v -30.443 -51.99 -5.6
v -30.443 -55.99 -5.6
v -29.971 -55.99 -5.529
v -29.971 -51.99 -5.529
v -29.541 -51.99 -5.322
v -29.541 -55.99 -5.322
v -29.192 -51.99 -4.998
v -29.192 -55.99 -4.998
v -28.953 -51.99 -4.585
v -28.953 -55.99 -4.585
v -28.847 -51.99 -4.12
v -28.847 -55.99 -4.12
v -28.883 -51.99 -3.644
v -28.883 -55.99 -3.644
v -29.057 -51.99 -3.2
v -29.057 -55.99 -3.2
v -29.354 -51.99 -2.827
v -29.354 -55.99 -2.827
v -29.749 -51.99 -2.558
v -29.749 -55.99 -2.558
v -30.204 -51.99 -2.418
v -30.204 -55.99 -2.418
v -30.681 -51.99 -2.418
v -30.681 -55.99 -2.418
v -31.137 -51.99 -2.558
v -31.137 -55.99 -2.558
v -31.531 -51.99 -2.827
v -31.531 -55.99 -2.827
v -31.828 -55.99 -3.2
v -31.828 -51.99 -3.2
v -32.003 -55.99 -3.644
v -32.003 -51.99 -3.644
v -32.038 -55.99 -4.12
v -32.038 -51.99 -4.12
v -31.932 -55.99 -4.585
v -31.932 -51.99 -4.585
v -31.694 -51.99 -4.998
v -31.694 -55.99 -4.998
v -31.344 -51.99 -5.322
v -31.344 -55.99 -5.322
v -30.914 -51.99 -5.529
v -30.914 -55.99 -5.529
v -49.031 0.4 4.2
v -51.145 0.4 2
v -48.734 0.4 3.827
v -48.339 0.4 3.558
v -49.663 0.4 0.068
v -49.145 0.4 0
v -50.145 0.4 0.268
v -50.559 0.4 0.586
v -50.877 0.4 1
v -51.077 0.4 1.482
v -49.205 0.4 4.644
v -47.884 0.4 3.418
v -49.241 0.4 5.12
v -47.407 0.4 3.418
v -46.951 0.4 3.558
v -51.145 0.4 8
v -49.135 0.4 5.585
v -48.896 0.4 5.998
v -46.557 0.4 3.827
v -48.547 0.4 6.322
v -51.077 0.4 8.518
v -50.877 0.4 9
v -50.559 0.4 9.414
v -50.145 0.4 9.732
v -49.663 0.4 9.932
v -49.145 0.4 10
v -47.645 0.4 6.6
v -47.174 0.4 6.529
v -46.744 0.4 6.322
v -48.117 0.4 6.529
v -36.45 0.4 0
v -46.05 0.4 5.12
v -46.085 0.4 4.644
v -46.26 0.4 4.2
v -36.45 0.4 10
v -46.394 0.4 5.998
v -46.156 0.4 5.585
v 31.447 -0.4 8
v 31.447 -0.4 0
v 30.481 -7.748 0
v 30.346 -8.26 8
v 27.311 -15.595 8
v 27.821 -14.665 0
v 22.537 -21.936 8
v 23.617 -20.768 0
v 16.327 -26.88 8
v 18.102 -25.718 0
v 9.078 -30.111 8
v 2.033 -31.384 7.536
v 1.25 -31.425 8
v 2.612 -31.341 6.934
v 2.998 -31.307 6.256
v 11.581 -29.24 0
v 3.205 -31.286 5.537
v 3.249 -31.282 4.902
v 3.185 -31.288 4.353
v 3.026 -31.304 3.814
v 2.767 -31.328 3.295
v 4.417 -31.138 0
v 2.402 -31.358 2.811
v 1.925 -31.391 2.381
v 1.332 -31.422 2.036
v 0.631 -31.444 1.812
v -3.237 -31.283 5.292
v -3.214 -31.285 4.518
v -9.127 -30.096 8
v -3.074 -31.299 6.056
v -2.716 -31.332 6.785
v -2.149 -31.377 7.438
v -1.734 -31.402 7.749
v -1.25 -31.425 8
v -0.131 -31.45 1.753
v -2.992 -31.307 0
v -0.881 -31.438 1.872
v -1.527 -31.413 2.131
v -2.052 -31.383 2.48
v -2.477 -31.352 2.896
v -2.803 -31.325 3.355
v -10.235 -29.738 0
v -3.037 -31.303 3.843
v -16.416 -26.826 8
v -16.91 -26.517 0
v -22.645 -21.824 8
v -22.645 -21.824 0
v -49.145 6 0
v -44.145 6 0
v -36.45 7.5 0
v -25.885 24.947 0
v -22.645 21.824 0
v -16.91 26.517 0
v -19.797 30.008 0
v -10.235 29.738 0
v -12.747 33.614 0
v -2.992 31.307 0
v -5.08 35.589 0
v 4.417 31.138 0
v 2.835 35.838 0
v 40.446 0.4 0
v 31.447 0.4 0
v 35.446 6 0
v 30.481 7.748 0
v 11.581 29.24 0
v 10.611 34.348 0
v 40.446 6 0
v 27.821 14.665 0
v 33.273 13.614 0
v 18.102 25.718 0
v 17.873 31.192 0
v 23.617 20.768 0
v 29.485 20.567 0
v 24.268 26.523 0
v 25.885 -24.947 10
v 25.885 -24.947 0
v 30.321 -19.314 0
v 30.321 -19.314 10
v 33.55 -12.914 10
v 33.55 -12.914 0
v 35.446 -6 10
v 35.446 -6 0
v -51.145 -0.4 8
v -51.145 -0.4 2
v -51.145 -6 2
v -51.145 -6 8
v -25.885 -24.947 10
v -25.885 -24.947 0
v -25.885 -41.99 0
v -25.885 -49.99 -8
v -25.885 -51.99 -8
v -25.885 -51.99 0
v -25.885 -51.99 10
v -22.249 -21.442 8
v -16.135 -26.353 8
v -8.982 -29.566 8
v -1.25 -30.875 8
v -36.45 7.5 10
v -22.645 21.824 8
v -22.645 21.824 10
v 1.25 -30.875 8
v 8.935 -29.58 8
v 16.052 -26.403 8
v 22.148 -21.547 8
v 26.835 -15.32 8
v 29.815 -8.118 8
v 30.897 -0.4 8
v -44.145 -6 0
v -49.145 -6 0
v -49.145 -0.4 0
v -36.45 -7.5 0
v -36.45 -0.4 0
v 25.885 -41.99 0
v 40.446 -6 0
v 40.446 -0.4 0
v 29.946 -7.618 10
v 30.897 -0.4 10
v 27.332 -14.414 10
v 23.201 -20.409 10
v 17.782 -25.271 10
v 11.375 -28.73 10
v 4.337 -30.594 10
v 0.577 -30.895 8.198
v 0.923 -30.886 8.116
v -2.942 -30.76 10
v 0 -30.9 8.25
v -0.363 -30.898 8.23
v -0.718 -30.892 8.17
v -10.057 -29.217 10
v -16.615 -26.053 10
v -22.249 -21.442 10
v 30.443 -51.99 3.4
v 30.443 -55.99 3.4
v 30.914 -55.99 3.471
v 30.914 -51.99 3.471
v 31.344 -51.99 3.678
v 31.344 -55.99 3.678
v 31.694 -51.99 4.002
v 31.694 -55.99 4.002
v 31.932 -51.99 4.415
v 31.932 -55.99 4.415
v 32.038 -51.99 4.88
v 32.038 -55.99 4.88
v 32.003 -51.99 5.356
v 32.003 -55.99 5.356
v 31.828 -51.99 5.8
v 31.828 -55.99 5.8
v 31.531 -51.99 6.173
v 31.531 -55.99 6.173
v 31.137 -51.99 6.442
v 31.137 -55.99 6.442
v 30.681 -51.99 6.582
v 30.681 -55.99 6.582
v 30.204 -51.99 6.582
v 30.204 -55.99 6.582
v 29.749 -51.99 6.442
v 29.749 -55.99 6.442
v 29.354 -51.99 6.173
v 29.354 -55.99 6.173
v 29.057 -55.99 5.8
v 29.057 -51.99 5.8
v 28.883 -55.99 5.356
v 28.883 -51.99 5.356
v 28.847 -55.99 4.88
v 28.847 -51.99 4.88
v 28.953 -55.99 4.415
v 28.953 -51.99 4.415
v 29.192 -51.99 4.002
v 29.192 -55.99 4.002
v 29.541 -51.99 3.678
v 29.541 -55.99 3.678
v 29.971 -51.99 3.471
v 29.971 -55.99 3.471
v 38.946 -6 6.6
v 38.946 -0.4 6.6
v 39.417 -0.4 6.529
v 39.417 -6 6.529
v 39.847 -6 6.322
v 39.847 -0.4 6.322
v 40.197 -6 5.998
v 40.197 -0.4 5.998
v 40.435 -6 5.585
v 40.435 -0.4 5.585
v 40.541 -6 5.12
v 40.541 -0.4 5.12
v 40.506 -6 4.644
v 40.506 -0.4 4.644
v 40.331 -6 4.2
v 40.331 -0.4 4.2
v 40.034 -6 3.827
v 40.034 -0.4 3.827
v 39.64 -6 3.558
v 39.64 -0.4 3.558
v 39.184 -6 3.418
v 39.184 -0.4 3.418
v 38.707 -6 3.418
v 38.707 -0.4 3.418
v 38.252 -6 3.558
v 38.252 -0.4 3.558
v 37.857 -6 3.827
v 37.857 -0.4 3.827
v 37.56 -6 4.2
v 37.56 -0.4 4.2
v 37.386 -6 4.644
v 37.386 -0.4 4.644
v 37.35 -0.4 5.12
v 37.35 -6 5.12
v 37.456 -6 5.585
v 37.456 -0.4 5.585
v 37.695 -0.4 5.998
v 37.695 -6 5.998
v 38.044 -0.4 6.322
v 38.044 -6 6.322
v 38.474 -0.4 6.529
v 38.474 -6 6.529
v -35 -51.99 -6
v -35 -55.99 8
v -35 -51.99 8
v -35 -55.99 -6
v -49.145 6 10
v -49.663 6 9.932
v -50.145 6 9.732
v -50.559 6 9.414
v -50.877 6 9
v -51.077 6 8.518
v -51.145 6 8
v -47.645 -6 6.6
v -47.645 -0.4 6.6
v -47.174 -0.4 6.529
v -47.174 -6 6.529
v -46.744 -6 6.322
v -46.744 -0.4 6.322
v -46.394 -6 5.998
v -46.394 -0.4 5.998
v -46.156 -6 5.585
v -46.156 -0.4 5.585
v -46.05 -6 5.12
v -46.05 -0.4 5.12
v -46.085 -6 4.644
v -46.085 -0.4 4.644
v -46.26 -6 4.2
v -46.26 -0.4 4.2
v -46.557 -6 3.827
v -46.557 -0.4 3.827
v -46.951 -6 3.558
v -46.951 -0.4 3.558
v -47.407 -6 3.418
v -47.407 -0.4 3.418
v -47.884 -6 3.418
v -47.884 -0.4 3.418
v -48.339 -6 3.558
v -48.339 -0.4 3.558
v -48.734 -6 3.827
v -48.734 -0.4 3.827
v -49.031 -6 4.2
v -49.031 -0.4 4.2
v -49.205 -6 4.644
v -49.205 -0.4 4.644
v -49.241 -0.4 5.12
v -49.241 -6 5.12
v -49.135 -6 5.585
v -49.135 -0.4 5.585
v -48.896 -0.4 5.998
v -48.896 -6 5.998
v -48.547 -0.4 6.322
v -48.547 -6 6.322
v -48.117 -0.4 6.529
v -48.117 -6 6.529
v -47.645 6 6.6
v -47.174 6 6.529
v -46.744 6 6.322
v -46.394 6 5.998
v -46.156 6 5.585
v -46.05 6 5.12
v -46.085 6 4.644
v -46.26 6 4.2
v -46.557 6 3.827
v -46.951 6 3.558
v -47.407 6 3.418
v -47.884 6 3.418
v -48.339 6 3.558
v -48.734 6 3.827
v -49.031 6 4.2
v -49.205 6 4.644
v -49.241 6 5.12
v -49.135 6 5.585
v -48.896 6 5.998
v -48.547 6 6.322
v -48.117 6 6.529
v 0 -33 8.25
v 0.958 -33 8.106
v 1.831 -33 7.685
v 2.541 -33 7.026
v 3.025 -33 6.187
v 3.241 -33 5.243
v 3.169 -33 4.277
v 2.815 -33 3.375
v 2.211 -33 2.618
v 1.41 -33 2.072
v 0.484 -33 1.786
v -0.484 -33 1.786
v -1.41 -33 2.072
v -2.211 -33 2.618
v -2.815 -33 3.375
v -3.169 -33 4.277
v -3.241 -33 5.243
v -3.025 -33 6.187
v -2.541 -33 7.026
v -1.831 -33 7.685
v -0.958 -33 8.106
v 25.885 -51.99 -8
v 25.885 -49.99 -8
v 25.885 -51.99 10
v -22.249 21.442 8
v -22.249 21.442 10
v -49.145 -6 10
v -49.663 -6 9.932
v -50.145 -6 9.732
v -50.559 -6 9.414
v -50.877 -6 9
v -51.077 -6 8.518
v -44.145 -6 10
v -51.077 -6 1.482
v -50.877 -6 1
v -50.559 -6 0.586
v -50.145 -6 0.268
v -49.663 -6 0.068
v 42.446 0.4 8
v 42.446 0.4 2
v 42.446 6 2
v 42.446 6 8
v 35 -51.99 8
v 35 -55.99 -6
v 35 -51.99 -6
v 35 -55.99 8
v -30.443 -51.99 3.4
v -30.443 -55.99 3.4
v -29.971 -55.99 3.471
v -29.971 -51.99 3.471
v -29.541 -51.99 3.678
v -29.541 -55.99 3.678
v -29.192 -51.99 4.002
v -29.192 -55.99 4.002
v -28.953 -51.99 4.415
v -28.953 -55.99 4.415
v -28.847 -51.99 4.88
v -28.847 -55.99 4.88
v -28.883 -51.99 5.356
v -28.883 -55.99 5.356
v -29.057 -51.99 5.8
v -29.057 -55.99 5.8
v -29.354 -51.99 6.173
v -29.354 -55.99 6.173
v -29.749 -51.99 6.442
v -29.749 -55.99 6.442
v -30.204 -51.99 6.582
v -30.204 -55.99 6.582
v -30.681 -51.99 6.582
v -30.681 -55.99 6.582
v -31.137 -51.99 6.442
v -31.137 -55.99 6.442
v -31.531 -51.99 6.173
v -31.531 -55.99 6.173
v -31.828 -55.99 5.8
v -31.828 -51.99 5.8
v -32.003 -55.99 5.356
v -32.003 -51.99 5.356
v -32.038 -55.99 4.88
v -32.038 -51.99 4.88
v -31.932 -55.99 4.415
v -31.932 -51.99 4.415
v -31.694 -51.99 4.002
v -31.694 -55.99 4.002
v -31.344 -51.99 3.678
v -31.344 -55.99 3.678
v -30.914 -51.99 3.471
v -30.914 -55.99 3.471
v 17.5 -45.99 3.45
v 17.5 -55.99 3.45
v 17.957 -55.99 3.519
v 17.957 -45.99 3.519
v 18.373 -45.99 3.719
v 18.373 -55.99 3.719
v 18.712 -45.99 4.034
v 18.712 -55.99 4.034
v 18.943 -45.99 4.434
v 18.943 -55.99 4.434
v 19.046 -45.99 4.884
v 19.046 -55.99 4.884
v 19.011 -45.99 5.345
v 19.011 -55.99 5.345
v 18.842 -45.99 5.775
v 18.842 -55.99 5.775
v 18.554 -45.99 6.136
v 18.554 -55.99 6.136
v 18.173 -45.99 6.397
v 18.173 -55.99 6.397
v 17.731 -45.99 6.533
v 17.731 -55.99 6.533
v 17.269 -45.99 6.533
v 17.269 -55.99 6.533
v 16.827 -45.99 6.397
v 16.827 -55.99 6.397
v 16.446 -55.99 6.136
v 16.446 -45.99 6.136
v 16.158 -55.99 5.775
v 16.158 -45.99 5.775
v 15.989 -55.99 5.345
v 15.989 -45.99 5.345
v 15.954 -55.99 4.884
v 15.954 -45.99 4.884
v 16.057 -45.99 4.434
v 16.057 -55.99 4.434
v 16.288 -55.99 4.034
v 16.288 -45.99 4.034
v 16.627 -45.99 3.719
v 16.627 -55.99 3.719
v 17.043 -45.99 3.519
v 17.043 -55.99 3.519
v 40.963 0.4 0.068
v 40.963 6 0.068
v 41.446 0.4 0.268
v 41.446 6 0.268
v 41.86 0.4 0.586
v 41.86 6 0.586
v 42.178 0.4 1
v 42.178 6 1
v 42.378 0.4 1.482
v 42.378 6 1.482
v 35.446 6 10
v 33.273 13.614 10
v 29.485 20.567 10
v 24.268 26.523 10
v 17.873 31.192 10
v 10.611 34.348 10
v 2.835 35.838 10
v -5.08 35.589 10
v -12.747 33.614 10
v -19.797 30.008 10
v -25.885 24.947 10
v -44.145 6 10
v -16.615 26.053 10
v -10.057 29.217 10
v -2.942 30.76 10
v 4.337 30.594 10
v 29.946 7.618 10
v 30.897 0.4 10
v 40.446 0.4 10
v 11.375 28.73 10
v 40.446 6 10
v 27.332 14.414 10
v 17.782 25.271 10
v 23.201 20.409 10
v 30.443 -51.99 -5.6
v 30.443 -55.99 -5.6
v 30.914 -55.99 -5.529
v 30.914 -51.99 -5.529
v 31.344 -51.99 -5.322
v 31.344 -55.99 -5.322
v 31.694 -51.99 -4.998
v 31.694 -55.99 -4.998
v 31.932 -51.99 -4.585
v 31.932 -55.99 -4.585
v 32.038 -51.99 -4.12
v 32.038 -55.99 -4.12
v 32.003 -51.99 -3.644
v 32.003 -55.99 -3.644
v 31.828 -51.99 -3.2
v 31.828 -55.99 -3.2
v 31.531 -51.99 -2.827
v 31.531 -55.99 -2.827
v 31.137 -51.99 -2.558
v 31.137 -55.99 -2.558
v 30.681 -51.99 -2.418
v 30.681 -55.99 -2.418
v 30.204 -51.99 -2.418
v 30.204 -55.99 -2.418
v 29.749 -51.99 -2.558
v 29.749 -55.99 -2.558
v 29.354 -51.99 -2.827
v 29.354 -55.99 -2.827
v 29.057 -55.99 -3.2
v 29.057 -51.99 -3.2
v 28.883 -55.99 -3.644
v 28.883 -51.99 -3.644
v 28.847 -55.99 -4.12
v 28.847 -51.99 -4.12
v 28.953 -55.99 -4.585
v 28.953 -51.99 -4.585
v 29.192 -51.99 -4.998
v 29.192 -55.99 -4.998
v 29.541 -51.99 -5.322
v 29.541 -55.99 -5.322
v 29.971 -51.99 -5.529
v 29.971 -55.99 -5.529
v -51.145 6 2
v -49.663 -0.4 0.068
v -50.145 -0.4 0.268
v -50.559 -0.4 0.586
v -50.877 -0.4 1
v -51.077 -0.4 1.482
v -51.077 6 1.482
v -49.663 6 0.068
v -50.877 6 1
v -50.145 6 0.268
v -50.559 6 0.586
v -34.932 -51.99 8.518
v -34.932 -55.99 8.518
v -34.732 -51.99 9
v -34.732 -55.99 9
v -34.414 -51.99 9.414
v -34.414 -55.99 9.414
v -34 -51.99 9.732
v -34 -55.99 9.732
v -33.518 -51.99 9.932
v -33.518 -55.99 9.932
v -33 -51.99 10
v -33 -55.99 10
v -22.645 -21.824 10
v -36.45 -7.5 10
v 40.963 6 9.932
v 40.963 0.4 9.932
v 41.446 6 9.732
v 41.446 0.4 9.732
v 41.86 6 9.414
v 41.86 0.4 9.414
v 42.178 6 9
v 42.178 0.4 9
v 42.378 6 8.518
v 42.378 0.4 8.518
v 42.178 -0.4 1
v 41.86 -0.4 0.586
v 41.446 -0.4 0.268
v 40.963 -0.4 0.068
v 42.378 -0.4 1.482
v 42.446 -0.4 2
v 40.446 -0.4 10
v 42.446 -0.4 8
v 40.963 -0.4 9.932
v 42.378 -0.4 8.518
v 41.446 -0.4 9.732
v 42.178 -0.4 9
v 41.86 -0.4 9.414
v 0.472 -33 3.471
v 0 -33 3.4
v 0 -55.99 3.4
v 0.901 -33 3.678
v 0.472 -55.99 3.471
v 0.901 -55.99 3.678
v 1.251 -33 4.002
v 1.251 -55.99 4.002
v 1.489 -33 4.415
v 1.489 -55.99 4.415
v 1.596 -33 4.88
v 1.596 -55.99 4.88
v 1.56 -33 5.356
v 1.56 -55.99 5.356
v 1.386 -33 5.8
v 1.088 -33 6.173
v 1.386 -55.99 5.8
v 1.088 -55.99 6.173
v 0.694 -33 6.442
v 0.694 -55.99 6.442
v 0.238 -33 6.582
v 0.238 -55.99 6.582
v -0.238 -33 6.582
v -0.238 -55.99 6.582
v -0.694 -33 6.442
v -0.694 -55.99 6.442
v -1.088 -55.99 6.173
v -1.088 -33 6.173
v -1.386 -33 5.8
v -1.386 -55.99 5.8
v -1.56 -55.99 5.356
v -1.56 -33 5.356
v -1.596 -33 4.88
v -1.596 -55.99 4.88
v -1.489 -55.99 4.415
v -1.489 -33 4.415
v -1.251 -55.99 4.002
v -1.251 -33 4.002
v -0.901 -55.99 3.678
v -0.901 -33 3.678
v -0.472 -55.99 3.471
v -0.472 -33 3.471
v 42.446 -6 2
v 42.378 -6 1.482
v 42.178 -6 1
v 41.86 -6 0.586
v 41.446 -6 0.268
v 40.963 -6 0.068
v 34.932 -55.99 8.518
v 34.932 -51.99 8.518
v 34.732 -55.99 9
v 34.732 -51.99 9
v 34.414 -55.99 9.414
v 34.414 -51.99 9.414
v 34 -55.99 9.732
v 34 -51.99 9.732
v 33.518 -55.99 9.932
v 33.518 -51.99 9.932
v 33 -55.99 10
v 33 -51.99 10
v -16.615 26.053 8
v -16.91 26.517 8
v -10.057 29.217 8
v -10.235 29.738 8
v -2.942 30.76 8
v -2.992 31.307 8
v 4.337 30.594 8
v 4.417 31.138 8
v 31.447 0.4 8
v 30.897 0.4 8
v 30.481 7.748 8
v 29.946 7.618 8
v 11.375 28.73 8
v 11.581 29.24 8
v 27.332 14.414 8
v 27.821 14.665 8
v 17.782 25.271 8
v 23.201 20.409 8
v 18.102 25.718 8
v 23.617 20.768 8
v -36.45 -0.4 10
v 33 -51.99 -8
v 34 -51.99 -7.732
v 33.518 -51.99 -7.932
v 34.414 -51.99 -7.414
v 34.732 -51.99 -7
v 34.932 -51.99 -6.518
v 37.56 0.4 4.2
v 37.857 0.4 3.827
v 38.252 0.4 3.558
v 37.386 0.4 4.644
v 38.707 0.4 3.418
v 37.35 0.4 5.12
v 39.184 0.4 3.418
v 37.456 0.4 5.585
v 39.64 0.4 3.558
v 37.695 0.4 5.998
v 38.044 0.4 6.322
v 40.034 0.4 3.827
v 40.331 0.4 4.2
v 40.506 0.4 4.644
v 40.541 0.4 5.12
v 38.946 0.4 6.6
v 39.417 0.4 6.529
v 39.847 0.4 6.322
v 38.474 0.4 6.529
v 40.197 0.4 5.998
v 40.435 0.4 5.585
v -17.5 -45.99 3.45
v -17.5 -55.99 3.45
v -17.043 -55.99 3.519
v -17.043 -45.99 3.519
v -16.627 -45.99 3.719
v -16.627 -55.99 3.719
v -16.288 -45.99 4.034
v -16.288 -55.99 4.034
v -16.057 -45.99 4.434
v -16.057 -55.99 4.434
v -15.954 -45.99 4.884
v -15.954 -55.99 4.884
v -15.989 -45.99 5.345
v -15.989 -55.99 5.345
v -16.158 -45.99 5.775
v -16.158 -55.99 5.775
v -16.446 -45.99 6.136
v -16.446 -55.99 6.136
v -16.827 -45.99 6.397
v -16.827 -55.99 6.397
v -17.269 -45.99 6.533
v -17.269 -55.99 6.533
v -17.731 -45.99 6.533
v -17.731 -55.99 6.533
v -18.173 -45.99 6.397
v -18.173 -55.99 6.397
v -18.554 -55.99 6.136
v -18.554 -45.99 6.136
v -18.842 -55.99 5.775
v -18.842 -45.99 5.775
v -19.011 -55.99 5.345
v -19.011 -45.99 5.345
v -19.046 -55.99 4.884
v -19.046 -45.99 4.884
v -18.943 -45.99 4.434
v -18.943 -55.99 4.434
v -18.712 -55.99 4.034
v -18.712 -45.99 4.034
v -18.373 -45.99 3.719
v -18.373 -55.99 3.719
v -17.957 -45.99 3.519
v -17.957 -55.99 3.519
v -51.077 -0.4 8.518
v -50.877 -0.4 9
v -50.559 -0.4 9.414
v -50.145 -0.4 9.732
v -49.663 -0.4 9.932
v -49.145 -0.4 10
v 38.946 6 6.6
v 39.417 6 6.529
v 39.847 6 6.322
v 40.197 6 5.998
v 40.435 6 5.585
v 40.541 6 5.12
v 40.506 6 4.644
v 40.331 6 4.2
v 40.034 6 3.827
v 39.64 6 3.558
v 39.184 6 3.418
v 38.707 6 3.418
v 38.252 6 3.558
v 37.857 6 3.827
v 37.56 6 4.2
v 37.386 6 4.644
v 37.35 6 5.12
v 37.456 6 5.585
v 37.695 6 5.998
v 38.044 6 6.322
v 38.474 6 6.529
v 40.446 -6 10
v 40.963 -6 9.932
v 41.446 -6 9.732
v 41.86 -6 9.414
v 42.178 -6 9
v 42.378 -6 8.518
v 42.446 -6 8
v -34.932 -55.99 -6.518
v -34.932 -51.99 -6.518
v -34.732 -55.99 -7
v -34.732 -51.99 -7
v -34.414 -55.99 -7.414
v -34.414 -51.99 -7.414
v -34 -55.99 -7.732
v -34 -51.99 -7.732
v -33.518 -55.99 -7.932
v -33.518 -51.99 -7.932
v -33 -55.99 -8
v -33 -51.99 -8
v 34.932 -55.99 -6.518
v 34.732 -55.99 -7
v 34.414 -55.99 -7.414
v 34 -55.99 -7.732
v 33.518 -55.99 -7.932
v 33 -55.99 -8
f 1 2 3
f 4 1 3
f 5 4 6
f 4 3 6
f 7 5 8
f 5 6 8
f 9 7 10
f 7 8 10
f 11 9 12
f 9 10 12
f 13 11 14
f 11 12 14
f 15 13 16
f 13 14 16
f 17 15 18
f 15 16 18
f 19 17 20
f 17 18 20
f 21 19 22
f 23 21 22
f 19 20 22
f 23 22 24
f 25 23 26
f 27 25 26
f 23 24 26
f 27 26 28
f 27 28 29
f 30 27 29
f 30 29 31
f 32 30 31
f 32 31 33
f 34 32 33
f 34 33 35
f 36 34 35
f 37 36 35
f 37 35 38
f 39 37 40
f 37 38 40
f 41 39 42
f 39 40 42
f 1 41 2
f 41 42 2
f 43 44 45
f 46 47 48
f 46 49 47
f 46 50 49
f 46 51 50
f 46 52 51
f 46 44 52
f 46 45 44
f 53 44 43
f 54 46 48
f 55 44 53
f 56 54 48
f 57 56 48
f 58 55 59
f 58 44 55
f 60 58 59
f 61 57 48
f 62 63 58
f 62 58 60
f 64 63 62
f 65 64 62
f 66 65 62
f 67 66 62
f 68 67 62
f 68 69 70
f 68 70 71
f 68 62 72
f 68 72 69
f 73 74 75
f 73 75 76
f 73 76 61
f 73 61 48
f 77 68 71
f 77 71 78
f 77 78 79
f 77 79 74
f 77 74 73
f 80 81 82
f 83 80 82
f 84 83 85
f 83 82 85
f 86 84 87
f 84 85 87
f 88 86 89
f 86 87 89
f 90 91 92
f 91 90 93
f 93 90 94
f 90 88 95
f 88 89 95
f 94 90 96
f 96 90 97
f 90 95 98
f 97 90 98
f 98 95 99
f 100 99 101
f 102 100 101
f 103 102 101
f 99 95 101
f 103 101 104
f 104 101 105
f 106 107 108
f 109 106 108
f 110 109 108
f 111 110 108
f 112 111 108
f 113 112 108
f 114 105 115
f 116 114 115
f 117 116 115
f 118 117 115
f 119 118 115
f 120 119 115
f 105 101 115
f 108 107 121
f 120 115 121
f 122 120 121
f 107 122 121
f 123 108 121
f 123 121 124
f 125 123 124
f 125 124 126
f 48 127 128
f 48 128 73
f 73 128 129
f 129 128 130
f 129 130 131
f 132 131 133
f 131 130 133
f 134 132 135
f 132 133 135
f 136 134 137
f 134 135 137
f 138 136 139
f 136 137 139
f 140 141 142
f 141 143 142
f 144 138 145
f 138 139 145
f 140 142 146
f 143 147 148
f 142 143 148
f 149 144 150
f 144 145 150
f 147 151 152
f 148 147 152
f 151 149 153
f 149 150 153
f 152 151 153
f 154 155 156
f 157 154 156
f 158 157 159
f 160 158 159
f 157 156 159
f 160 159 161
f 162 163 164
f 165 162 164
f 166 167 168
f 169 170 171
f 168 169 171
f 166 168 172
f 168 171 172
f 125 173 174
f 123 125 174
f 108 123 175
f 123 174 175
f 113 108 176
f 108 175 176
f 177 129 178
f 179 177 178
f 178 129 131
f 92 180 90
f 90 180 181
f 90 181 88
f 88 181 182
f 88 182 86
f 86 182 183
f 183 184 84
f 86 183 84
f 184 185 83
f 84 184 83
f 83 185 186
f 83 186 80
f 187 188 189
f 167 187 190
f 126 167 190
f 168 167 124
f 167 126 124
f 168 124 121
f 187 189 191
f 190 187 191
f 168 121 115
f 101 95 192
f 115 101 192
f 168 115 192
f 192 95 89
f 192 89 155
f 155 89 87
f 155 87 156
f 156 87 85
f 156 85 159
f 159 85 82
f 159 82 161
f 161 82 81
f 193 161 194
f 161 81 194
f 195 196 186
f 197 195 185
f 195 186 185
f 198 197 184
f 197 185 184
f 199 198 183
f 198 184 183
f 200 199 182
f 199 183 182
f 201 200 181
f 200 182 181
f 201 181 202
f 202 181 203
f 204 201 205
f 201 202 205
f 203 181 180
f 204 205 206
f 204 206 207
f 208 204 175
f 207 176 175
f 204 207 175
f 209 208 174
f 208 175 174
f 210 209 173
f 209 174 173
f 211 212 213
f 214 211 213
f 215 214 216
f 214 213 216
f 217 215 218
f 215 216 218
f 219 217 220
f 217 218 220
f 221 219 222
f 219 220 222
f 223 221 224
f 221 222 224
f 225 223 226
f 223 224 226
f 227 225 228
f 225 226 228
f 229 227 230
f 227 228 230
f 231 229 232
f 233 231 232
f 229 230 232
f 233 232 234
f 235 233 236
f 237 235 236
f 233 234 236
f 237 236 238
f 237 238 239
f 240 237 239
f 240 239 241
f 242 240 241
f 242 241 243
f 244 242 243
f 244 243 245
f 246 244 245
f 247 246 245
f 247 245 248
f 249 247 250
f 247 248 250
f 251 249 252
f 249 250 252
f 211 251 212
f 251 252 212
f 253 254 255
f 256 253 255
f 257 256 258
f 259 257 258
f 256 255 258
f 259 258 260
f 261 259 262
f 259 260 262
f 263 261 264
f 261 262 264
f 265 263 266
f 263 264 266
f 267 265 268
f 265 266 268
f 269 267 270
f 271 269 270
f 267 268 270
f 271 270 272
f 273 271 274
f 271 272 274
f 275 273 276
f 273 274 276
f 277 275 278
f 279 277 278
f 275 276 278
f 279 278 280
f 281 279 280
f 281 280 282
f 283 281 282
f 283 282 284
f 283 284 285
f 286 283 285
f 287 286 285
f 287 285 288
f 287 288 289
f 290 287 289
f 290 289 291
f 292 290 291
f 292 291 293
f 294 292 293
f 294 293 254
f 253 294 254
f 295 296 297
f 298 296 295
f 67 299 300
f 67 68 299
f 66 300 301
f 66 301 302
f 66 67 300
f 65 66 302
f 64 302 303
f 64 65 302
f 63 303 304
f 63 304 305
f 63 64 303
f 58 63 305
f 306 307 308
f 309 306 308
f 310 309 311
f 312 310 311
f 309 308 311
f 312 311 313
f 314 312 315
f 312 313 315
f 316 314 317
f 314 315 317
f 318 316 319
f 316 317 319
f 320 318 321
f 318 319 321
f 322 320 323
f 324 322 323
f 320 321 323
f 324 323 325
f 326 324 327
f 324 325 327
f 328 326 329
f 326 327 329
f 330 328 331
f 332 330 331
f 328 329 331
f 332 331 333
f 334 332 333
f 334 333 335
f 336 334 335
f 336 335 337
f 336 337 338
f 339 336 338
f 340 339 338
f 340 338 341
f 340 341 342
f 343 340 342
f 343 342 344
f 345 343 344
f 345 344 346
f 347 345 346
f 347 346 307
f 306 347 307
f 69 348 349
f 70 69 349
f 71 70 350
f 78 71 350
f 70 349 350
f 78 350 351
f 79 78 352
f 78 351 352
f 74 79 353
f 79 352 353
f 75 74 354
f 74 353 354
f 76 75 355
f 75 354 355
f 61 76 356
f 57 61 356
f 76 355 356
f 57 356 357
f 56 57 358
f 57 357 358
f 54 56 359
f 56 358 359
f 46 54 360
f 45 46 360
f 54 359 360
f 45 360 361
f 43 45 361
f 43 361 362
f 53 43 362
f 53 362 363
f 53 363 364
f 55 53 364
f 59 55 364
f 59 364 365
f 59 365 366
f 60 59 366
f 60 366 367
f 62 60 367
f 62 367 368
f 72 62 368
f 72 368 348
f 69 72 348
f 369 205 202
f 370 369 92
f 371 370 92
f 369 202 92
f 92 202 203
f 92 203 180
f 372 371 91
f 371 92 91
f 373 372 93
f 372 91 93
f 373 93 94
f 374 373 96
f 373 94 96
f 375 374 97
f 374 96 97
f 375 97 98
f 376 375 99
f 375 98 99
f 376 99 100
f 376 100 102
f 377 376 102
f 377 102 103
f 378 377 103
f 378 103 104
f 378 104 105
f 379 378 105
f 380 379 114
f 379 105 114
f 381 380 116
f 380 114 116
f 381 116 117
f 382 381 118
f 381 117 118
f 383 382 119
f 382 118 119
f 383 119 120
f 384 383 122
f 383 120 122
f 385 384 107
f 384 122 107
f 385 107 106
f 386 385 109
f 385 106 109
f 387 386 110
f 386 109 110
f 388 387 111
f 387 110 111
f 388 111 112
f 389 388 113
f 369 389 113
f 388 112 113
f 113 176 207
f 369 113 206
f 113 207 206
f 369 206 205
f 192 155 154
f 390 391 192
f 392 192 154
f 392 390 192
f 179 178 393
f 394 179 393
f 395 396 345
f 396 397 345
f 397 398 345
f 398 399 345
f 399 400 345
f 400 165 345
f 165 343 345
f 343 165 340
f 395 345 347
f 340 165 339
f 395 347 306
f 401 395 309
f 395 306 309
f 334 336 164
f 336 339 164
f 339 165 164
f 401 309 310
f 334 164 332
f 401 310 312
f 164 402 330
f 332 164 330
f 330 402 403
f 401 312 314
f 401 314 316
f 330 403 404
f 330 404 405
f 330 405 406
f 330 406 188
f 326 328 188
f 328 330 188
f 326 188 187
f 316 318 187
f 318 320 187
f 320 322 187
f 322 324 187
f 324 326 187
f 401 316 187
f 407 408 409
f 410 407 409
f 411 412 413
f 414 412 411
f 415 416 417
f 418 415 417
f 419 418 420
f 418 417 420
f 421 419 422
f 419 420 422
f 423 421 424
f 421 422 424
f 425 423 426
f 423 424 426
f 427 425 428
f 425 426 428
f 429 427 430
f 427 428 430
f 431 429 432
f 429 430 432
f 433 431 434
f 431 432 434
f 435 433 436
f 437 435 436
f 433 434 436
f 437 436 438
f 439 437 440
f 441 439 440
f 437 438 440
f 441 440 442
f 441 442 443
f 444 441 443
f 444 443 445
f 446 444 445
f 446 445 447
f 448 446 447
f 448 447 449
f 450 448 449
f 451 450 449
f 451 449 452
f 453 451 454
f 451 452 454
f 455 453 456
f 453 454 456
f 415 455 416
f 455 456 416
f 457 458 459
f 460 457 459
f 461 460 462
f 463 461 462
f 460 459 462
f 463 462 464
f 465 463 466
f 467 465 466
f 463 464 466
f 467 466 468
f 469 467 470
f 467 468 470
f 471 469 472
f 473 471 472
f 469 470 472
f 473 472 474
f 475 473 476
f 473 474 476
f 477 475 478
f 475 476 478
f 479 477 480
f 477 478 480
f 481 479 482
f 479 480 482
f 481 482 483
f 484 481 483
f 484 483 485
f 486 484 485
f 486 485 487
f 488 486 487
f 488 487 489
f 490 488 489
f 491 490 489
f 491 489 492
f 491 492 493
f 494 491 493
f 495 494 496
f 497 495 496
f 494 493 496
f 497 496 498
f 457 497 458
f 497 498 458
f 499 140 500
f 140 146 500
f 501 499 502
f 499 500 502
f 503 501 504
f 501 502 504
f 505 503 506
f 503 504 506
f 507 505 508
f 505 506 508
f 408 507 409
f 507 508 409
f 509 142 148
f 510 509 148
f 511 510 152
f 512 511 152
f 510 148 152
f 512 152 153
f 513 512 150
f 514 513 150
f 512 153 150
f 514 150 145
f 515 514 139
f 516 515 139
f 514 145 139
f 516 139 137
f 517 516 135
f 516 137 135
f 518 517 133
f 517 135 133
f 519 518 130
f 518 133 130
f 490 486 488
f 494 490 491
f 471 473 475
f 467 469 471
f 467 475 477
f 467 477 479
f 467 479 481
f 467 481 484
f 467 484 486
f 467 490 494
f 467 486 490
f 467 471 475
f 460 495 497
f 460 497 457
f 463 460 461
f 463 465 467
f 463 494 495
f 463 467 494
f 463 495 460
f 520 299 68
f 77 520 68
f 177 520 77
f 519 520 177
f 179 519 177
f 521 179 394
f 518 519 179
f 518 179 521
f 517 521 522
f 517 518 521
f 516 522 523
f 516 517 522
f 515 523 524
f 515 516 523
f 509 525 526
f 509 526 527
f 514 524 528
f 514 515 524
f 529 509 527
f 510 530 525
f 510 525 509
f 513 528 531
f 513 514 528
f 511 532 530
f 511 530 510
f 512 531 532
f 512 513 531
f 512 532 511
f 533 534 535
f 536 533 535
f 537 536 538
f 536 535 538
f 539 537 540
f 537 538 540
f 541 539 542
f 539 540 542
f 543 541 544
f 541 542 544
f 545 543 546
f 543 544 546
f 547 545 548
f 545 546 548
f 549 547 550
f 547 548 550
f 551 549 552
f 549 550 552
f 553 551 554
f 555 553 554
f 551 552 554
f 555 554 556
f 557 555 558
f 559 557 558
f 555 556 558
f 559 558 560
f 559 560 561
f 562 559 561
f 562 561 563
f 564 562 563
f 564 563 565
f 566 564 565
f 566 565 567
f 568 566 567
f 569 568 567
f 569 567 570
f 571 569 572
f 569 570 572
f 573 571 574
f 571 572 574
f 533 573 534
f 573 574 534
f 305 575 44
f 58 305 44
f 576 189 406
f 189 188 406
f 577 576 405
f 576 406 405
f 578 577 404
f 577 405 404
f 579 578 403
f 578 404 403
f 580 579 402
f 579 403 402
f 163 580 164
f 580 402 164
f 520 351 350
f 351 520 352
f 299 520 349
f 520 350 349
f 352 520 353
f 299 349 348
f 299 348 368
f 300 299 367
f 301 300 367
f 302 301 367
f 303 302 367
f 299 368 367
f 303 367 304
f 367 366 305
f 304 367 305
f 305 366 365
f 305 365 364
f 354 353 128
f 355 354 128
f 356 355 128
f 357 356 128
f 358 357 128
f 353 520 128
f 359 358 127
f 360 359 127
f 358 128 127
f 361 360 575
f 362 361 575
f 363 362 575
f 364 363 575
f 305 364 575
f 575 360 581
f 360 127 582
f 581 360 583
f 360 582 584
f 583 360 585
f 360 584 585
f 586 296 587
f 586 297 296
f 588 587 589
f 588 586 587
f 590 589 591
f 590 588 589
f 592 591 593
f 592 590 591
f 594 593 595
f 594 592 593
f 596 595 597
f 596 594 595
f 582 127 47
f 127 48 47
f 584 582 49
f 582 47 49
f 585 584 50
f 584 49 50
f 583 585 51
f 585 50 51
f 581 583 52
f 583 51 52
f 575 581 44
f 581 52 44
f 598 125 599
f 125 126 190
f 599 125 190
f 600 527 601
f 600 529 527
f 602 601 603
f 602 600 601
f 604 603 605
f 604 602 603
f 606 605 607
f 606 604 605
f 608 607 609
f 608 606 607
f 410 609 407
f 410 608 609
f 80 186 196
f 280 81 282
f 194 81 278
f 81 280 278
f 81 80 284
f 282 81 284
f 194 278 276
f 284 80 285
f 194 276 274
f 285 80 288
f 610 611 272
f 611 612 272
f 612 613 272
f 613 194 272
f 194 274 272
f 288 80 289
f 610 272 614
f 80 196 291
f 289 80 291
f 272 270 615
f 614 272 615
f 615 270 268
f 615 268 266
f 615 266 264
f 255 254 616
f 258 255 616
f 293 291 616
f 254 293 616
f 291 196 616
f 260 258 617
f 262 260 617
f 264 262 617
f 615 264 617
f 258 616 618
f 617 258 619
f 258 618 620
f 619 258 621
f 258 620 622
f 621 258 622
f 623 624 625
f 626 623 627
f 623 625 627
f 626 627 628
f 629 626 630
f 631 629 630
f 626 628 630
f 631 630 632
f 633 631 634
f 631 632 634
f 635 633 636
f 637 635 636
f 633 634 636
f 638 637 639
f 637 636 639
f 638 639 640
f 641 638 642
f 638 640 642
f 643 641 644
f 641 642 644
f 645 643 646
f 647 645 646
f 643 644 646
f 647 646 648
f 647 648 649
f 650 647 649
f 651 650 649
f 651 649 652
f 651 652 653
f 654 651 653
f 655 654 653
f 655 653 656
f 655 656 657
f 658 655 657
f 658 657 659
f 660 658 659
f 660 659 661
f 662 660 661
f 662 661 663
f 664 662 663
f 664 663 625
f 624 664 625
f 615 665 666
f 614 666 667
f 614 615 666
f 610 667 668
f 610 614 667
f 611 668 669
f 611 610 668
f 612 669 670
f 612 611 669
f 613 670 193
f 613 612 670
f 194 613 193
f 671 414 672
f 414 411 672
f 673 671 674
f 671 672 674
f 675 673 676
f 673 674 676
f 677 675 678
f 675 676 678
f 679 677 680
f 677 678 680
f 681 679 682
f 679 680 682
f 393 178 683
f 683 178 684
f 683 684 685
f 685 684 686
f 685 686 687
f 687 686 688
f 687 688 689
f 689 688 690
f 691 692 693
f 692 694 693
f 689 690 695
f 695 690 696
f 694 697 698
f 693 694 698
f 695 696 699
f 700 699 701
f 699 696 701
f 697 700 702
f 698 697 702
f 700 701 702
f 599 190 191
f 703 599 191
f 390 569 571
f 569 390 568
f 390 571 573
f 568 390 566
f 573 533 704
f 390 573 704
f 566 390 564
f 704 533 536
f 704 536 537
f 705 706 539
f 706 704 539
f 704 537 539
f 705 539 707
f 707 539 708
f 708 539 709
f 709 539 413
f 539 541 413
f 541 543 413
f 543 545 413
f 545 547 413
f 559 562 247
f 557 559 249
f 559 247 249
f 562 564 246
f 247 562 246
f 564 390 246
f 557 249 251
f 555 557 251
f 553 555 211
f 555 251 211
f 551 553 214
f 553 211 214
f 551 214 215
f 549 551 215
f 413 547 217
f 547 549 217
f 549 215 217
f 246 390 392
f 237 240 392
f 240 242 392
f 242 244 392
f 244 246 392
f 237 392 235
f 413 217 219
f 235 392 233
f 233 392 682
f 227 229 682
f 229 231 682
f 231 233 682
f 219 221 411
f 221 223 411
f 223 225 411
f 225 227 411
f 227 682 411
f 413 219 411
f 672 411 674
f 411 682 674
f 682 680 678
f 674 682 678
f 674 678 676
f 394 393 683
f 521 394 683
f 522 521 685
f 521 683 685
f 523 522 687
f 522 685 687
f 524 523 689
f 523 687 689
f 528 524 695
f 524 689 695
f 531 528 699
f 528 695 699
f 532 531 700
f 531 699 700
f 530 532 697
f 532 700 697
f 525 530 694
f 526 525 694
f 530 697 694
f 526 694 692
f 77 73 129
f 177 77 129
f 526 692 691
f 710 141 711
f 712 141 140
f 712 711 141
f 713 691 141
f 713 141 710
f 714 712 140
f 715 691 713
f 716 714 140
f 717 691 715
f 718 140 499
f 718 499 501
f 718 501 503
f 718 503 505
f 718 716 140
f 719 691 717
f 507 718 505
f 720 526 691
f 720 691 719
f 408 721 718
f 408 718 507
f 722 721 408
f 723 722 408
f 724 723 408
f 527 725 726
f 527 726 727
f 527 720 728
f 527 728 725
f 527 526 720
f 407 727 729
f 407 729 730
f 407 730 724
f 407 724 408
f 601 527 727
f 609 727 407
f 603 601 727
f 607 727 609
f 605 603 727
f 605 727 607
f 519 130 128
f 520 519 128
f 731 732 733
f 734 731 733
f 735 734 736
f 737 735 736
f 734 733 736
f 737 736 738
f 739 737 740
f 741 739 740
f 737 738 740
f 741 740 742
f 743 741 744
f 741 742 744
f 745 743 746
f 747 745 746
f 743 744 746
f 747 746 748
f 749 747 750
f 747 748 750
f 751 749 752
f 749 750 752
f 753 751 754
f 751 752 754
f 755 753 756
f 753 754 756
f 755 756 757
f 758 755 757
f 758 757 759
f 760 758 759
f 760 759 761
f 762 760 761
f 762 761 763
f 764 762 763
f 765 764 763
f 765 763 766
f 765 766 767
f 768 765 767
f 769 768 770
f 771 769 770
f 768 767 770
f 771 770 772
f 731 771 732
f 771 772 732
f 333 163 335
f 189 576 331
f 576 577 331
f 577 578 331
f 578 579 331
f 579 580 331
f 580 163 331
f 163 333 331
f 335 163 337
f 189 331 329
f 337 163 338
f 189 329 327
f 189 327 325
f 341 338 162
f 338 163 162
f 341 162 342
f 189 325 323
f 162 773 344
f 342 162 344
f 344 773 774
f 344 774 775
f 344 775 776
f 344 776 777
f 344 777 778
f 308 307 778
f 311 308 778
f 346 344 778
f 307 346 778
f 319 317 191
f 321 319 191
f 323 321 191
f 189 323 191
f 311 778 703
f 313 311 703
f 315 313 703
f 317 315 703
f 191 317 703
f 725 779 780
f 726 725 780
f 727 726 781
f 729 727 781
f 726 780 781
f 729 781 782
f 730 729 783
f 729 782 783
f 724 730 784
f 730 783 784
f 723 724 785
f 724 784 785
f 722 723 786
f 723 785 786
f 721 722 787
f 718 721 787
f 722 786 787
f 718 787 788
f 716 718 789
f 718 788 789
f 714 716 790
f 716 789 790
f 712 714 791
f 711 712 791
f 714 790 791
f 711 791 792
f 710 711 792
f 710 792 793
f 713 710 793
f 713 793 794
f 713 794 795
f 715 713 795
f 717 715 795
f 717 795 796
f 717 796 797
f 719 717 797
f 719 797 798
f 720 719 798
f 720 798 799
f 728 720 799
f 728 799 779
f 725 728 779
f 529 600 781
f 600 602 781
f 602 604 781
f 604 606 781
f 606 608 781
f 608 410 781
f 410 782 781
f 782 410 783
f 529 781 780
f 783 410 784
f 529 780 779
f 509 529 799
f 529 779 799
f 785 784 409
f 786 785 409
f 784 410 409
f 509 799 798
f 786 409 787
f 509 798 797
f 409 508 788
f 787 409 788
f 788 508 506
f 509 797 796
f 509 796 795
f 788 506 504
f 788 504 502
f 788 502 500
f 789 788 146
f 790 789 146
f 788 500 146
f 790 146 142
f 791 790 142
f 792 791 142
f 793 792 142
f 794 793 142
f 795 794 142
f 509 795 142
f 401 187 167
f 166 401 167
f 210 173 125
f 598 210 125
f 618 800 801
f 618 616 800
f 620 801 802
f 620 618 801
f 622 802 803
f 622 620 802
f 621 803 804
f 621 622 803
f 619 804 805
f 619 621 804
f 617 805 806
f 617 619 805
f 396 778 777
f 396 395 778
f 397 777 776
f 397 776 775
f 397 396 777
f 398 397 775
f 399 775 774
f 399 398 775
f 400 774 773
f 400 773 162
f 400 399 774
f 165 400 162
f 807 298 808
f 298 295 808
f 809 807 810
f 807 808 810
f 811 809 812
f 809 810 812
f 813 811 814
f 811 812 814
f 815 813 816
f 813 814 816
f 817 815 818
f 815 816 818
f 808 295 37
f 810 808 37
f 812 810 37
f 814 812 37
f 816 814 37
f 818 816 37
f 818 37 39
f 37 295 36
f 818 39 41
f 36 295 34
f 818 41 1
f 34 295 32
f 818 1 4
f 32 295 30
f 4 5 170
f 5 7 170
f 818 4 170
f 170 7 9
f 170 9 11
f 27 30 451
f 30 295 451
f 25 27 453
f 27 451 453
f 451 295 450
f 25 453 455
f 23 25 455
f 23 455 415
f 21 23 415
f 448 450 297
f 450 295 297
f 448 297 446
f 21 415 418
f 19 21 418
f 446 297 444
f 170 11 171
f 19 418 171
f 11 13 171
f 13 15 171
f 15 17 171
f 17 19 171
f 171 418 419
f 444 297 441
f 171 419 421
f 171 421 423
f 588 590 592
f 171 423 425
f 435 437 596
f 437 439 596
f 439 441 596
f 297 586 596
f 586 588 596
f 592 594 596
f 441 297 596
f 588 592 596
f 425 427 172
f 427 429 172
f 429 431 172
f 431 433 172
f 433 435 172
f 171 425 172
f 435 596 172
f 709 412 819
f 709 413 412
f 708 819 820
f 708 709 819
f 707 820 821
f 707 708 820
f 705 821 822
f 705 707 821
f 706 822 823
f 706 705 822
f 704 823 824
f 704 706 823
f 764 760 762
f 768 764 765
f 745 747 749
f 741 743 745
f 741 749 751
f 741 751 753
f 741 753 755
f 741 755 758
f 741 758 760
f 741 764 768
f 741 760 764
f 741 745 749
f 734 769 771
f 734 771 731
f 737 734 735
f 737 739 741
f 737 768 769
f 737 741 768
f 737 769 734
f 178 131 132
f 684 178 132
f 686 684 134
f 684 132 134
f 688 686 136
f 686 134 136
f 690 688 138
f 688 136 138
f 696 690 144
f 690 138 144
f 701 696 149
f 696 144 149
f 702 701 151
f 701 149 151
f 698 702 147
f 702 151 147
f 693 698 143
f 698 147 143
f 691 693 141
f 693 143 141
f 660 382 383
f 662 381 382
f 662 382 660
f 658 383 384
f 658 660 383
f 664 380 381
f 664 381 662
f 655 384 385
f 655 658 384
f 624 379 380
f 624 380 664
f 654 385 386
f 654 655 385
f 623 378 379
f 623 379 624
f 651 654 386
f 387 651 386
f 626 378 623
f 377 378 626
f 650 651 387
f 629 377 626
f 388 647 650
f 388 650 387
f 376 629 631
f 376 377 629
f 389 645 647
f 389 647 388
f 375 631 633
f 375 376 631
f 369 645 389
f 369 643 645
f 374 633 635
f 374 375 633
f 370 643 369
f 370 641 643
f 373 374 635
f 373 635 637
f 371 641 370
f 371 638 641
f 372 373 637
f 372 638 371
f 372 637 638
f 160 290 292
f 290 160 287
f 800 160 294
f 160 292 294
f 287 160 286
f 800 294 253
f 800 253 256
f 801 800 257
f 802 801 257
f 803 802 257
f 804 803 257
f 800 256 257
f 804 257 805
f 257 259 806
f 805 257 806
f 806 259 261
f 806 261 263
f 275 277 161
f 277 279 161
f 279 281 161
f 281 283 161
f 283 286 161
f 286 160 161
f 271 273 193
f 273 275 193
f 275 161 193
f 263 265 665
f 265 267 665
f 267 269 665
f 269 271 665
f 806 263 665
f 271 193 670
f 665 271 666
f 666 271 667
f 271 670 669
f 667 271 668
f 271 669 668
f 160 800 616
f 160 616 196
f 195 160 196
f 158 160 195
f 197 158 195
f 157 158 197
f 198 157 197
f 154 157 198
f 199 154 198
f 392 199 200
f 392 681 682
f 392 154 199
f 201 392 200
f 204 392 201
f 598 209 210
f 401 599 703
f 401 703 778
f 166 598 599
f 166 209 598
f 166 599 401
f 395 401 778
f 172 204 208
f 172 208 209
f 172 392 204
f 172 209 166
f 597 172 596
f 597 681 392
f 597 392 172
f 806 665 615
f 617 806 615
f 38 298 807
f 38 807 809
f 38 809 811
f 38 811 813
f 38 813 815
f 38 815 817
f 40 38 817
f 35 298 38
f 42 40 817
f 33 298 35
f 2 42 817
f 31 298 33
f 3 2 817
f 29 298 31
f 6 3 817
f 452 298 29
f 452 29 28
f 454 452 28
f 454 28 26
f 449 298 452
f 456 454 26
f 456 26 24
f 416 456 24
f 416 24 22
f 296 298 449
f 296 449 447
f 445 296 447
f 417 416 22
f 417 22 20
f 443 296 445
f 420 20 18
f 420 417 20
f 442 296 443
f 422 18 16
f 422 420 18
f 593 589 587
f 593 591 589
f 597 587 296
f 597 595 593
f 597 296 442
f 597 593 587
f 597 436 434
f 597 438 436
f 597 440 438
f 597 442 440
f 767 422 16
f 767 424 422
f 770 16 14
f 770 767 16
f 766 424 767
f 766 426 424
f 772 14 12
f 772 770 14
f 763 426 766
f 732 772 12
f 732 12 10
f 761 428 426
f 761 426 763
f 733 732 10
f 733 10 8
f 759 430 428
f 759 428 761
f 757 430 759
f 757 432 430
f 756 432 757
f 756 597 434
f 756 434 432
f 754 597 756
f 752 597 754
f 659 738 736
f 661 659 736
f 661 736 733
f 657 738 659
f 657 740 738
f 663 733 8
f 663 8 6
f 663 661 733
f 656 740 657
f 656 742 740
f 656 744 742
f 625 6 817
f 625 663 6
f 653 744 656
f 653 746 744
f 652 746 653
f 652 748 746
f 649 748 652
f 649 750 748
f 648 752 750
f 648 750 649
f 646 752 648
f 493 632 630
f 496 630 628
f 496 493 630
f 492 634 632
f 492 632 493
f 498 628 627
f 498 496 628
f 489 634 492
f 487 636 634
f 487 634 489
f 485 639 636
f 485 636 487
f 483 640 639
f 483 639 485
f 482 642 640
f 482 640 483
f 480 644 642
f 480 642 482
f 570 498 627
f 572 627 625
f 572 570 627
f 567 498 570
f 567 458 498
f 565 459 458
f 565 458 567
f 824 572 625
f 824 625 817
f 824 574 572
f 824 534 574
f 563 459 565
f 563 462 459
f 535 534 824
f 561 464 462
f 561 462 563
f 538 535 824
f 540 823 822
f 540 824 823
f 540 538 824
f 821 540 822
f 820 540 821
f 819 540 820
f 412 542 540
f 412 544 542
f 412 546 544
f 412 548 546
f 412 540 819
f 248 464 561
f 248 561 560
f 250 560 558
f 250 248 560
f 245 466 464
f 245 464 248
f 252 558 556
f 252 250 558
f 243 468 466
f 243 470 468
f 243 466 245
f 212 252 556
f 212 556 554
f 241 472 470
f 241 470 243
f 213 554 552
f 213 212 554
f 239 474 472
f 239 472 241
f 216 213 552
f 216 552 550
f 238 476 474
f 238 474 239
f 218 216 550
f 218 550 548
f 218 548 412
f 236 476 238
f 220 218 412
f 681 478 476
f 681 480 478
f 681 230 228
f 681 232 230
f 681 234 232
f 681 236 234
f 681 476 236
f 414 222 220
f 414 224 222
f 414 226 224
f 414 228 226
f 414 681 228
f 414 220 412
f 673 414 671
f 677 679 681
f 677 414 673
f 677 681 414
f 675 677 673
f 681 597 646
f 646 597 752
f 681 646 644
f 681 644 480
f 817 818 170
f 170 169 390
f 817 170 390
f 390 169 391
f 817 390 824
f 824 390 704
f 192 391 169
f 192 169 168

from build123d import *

# Parameters (mm, degrees)
BOSS_EXTRUDE1_DEPTH = 10
BOSS_EXTRUDE2_START = -2
BOSS_EXTRUDE2_DEPTH = 2
SKETCH3_W           = 112.571331904
SKETCH3_H           = 0.8
CUT_EXTRUDE1_DEPTH  = 77.489973678
SKETCH4_R           = 1.55
CUT_EXTRUDE2_DEPTH  = 10
SKETCH5_R           = 1.6
CUT_EXTRUDE3_DEPTH  = 81.985159587
FILLET1_R           = 2
FILLET2_R           = 2
SKETCH6_R           = 1.6
BOSS_EXTRUDE3_DEPTH = 4
FILLET3_R           = 2
CHAMFER1_SIZE       = 10
SKETCH7_R           = 1.6
CUT_EXTRUDE4_DEPTH  = 49
SKETCH8_R           = 3.25
CUT_EXTRUDE5_DEPTH  = 33


with BuildPart() as part:
    # Sketch1 → Boss-Extrude1 (new body)
    with BuildSketch(Plane.XY):
        with BuildLine():
            Line((42.445768436, 6), (35.445768436, 6))
            ThreePointArc((35.445768436, 6), (10.611085103, 34.348324165), (-25.885497938, 24.946813353))
            Line((-25.885497938, 24.946813353), (-44.145243897, 6))
            Line((-44.145243897, 6), (-51.145243897, 6))
            Line((-51.145243897, 6), (-51.145243897, -6))
            Line((-51.145243897, -6), (-44.145243897, -6))
            Line((-44.145243897, -6), (-25.885497938, -24.946813353))
            Line((-25.885497938, -24.946813353), (-25.885497938, -55.99))
            Line((-25.885497938, -55.99), (25.885497938, -55.99))
            Line((25.885497938, -55.99), (25.885497938, -24.946813353))
            ThreePointArc((25.885497938, -24.946813353), (32.095583697, -16.194937702), (35.445768436, -6))
            Line((35.445768436, -6), (42.445768436, -6))
            Line((42.445768436, -6), (42.445768436, 6))
        make_face()
        with BuildLine():
            ThreePointArc((-22.645310436, 21.824124617), (31.45, 0), (-22.645310436, -21.824124617))
            Line((-22.645310436, -21.824124617), (-36.45, -7.5))
            Line((-36.45, -7.5), (-36.45, 7.5))
            Line((-36.45, 7.5), (-22.645310436, 21.824124617))
        make_face(mode=Mode.SUBTRACT)
    extrude(amount=BOSS_EXTRUDE1_DEPTH)

    # Sketch2 → Boss-Extrude2 (add)
    with BuildSketch(Plane.XY.offset(10).offset(BOSS_EXTRUDE2_START)):
        with BuildLine():
            ThreePointArc((-22.645310436, -21.824124617), (31.45, 0), (-22.645310436, 21.824124617))
            Line((-22.645310436, 21.824124617), (-22.249287519, 21.44246266))
            ThreePointArc((-22.249287519, 21.44246266), (11.560861034, 28.655828241), (30.9, 0))
            ThreePointArc((30.9, 0), (11.560861034, -28.655828241), (-22.249287519, -21.44246266))
            Line((-22.249287519, -21.44246266), (-22.645310436, -21.824124617))
        make_face()
    extrude(amount=BOSS_EXTRUDE2_DEPTH)

    # Sketch3 → Cut-Extrude1 (cut, through all)
    with BuildSketch(Plane.XY.offset(10)):
        Rectangle(SKETCH3_W, SKETCH3_H)
    extrude(amount=-CUT_EXTRUDE1_DEPTH, mode=Mode.SUBTRACT)


with BuildPart() as cut_extrude1_piece_1:
    # of the separate pieces the step leaves, piece 1, a body of its own (cut_extrude1_pieces)
    add(part.part.solids().sort_by_distance((35.445768436, -6, 0))[0])

    # Sketch4 → Cut-Extrude2 (cut)
    with BuildSketch(Plane.XZ.offset(55.99)):
        with Locations(Location((-17.5, 5, 0), (0, 0, 270))):
            Circle(SKETCH4_R)
        with Locations(Location((17.5, 5, 0), (0, 0, 270))):
            Circle(SKETCH4_R)
    extrude(amount=-CUT_EXTRUDE2_DEPTH, mode=Mode.SUBTRACT)


with BuildPart() as cut_extrude1_piece_2:
    # of the separate pieces the step leaves, piece 2, a body of its own (cut_extrude1_pieces)
    add(part.part.solids().sort_by_distance((42.445768436, 0.4, 0))[0])


with BuildPart() as cut_extrude3_tool:
    # Sketch5 → Cut-Extrude3 (new, through all)
    with BuildSketch(Plane(origin=(0, 6, 0), x_dir=(1, 0, 0), z_dir=(0, 1, 0))):
        with Locations(Location((-47.645243897, -5, 0), (0, 0, 270))):
            Circle(SKETCH5_R)
        with Locations(Location((38.945768436, -5, 0), (0, 0, 270))):
            Circle(SKETCH5_R)
    extrude(amount=-CUT_EXTRUDE3_DEPTH)


with BuildPart() as cut_extrude1_piece_1_1:
    add(cut_extrude1_piece_1.part)

    # Cut-Extrude3: cut by cut_extrude3_tool
    add(cut_extrude3_tool.part, mode=Mode.SUBTRACT)

    # Fillet2
    fillet2_edges = [cut_extrude1_piece_1_1.edges().sort_by_distance(p)[0] for p in [
        (-51.145243897, -3.2, 0),
        (42.445768436, -3.2, 0),
        (-51.145243897, -3.2, 10),
        (42.445768436, -3.2, 10),
    ]]
    fillet(fillet2_edges, radius=FILLET2_R)

    # Sketch6 → Boss-Extrude3 (add)
    with BuildSketch(Plane.XZ.offset(55.99)):
        Polygon((35, -8), (35, 10), (25.885497938, 10), (25.885497938, 0), (-25.885497938, 0), (-25.885497938, 10), (-35, 10), (-35, -8), align=None)
        with Locations(Location((-30.442748969, 5, 0), (0, 0, 270))):
            Circle(SKETCH6_R, mode=Mode.SUBTRACT)
        with Locations(Location((30.442748969, -4, 0), (0, 0, 270))):
            Circle(SKETCH6_R, mode=Mode.SUBTRACT)
        with Locations(Location((30.442748969, 5, 0), (0, 0, 270))):
            Circle(SKETCH6_R, mode=Mode.SUBTRACT)
        with Locations(Location((-30.442748969, -4, 0), (0, 0, 270))):
            Circle(SKETCH6_R, mode=Mode.SUBTRACT)
    extrude(amount=-BOSS_EXTRUDE3_DEPTH)

    # Fillet3
    fillet3_edges = [cut_extrude1_piece_1_1.edges().sort_by_distance(p)[0] for p in [
        (35, -53.99, 10),
        (35, -53.99, -8),
        (-35, -53.99, -8),
        (-35, -53.99, 10),
    ]]
    fillet(fillet3_edges, radius=FILLET3_R)

    # Chamfer1
    # the kernel refuses this chamfer: 10 mm, written as the material it adds along each edge
    with BuildSketch(Plane(origin=(25.885497938, -51.99, 0), x_dir=(0, -0.027495876610586317, -0.9996219169112968), z_dir=(-1, 0, 0))) as chamfer1_piece_1_section:
        Polygon((CHAMFER1_SIZE * 0.999621916911, -CHAMFER1_SIZE * 0.0274958766106), (-CHAMFER1_SIZE * 0.0274958766106, -CHAMFER1_SIZE * 0.999621916911), (0, 0), align=None)
    chamfer1_piece_1 = extrude(amount=51.770995877, mode=Mode.PRIVATE)
    chamfer1_piece_1 = split(chamfer1_piece_1, bisect_by=Plane(origin=(0, -48.545555556, -8), z_dir=(0, 0, 1)), keep=Keep.TOP, mode=Mode.PRIVATE)
    add(chamfer1_piece_1)

    # Sketch7 → Cut-Extrude4 (cut)
    with BuildSketch(Plane.XZ.offset(55.99)):
        with Locations(Location((0, 5, 0), (0, 0, 270))):
            Circle(SKETCH7_R)
    extrude(amount=-CUT_EXTRUDE4_DEPTH, mode=Mode.SUBTRACT)

    # Sketch8 → Cut-Extrude5 (cut)
    with BuildSketch(Plane(origin=(0, 0, 0), x_dir=(1, 0, 0), z_dir=(0, 1, 0))):
        with Locations(Location((0, -5, 0), (0, 0, 270))):
            Circle(SKETCH8_R)
    extrude(amount=-CUT_EXTRUDE5_DEPTH, mode=Mode.SUBTRACT)


with BuildPart() as cut_extrude1_piece_2_1:
    add(cut_extrude1_piece_2.part)

    # Cut-Extrude3: cut by cut_extrude3_tool
    add(cut_extrude3_tool.part, mode=Mode.SUBTRACT)

    # Fillet1
    fillet1_edges = [cut_extrude1_piece_2_1.edges().sort_by_distance(p)[0] for p in [
        (-51.145243897, 3.2, 0),
        (-51.145243897, 3.2, 10),
        (42.445768436, 3.2, 0),
        (42.445768436, 3.2, 10),
    ]]
    fillet(fillet1_edges, radius=FILLET1_R)


solid = Compound([cut_extrude1_piece_1_1.part, cut_extrude1_piece_2_1.part])
